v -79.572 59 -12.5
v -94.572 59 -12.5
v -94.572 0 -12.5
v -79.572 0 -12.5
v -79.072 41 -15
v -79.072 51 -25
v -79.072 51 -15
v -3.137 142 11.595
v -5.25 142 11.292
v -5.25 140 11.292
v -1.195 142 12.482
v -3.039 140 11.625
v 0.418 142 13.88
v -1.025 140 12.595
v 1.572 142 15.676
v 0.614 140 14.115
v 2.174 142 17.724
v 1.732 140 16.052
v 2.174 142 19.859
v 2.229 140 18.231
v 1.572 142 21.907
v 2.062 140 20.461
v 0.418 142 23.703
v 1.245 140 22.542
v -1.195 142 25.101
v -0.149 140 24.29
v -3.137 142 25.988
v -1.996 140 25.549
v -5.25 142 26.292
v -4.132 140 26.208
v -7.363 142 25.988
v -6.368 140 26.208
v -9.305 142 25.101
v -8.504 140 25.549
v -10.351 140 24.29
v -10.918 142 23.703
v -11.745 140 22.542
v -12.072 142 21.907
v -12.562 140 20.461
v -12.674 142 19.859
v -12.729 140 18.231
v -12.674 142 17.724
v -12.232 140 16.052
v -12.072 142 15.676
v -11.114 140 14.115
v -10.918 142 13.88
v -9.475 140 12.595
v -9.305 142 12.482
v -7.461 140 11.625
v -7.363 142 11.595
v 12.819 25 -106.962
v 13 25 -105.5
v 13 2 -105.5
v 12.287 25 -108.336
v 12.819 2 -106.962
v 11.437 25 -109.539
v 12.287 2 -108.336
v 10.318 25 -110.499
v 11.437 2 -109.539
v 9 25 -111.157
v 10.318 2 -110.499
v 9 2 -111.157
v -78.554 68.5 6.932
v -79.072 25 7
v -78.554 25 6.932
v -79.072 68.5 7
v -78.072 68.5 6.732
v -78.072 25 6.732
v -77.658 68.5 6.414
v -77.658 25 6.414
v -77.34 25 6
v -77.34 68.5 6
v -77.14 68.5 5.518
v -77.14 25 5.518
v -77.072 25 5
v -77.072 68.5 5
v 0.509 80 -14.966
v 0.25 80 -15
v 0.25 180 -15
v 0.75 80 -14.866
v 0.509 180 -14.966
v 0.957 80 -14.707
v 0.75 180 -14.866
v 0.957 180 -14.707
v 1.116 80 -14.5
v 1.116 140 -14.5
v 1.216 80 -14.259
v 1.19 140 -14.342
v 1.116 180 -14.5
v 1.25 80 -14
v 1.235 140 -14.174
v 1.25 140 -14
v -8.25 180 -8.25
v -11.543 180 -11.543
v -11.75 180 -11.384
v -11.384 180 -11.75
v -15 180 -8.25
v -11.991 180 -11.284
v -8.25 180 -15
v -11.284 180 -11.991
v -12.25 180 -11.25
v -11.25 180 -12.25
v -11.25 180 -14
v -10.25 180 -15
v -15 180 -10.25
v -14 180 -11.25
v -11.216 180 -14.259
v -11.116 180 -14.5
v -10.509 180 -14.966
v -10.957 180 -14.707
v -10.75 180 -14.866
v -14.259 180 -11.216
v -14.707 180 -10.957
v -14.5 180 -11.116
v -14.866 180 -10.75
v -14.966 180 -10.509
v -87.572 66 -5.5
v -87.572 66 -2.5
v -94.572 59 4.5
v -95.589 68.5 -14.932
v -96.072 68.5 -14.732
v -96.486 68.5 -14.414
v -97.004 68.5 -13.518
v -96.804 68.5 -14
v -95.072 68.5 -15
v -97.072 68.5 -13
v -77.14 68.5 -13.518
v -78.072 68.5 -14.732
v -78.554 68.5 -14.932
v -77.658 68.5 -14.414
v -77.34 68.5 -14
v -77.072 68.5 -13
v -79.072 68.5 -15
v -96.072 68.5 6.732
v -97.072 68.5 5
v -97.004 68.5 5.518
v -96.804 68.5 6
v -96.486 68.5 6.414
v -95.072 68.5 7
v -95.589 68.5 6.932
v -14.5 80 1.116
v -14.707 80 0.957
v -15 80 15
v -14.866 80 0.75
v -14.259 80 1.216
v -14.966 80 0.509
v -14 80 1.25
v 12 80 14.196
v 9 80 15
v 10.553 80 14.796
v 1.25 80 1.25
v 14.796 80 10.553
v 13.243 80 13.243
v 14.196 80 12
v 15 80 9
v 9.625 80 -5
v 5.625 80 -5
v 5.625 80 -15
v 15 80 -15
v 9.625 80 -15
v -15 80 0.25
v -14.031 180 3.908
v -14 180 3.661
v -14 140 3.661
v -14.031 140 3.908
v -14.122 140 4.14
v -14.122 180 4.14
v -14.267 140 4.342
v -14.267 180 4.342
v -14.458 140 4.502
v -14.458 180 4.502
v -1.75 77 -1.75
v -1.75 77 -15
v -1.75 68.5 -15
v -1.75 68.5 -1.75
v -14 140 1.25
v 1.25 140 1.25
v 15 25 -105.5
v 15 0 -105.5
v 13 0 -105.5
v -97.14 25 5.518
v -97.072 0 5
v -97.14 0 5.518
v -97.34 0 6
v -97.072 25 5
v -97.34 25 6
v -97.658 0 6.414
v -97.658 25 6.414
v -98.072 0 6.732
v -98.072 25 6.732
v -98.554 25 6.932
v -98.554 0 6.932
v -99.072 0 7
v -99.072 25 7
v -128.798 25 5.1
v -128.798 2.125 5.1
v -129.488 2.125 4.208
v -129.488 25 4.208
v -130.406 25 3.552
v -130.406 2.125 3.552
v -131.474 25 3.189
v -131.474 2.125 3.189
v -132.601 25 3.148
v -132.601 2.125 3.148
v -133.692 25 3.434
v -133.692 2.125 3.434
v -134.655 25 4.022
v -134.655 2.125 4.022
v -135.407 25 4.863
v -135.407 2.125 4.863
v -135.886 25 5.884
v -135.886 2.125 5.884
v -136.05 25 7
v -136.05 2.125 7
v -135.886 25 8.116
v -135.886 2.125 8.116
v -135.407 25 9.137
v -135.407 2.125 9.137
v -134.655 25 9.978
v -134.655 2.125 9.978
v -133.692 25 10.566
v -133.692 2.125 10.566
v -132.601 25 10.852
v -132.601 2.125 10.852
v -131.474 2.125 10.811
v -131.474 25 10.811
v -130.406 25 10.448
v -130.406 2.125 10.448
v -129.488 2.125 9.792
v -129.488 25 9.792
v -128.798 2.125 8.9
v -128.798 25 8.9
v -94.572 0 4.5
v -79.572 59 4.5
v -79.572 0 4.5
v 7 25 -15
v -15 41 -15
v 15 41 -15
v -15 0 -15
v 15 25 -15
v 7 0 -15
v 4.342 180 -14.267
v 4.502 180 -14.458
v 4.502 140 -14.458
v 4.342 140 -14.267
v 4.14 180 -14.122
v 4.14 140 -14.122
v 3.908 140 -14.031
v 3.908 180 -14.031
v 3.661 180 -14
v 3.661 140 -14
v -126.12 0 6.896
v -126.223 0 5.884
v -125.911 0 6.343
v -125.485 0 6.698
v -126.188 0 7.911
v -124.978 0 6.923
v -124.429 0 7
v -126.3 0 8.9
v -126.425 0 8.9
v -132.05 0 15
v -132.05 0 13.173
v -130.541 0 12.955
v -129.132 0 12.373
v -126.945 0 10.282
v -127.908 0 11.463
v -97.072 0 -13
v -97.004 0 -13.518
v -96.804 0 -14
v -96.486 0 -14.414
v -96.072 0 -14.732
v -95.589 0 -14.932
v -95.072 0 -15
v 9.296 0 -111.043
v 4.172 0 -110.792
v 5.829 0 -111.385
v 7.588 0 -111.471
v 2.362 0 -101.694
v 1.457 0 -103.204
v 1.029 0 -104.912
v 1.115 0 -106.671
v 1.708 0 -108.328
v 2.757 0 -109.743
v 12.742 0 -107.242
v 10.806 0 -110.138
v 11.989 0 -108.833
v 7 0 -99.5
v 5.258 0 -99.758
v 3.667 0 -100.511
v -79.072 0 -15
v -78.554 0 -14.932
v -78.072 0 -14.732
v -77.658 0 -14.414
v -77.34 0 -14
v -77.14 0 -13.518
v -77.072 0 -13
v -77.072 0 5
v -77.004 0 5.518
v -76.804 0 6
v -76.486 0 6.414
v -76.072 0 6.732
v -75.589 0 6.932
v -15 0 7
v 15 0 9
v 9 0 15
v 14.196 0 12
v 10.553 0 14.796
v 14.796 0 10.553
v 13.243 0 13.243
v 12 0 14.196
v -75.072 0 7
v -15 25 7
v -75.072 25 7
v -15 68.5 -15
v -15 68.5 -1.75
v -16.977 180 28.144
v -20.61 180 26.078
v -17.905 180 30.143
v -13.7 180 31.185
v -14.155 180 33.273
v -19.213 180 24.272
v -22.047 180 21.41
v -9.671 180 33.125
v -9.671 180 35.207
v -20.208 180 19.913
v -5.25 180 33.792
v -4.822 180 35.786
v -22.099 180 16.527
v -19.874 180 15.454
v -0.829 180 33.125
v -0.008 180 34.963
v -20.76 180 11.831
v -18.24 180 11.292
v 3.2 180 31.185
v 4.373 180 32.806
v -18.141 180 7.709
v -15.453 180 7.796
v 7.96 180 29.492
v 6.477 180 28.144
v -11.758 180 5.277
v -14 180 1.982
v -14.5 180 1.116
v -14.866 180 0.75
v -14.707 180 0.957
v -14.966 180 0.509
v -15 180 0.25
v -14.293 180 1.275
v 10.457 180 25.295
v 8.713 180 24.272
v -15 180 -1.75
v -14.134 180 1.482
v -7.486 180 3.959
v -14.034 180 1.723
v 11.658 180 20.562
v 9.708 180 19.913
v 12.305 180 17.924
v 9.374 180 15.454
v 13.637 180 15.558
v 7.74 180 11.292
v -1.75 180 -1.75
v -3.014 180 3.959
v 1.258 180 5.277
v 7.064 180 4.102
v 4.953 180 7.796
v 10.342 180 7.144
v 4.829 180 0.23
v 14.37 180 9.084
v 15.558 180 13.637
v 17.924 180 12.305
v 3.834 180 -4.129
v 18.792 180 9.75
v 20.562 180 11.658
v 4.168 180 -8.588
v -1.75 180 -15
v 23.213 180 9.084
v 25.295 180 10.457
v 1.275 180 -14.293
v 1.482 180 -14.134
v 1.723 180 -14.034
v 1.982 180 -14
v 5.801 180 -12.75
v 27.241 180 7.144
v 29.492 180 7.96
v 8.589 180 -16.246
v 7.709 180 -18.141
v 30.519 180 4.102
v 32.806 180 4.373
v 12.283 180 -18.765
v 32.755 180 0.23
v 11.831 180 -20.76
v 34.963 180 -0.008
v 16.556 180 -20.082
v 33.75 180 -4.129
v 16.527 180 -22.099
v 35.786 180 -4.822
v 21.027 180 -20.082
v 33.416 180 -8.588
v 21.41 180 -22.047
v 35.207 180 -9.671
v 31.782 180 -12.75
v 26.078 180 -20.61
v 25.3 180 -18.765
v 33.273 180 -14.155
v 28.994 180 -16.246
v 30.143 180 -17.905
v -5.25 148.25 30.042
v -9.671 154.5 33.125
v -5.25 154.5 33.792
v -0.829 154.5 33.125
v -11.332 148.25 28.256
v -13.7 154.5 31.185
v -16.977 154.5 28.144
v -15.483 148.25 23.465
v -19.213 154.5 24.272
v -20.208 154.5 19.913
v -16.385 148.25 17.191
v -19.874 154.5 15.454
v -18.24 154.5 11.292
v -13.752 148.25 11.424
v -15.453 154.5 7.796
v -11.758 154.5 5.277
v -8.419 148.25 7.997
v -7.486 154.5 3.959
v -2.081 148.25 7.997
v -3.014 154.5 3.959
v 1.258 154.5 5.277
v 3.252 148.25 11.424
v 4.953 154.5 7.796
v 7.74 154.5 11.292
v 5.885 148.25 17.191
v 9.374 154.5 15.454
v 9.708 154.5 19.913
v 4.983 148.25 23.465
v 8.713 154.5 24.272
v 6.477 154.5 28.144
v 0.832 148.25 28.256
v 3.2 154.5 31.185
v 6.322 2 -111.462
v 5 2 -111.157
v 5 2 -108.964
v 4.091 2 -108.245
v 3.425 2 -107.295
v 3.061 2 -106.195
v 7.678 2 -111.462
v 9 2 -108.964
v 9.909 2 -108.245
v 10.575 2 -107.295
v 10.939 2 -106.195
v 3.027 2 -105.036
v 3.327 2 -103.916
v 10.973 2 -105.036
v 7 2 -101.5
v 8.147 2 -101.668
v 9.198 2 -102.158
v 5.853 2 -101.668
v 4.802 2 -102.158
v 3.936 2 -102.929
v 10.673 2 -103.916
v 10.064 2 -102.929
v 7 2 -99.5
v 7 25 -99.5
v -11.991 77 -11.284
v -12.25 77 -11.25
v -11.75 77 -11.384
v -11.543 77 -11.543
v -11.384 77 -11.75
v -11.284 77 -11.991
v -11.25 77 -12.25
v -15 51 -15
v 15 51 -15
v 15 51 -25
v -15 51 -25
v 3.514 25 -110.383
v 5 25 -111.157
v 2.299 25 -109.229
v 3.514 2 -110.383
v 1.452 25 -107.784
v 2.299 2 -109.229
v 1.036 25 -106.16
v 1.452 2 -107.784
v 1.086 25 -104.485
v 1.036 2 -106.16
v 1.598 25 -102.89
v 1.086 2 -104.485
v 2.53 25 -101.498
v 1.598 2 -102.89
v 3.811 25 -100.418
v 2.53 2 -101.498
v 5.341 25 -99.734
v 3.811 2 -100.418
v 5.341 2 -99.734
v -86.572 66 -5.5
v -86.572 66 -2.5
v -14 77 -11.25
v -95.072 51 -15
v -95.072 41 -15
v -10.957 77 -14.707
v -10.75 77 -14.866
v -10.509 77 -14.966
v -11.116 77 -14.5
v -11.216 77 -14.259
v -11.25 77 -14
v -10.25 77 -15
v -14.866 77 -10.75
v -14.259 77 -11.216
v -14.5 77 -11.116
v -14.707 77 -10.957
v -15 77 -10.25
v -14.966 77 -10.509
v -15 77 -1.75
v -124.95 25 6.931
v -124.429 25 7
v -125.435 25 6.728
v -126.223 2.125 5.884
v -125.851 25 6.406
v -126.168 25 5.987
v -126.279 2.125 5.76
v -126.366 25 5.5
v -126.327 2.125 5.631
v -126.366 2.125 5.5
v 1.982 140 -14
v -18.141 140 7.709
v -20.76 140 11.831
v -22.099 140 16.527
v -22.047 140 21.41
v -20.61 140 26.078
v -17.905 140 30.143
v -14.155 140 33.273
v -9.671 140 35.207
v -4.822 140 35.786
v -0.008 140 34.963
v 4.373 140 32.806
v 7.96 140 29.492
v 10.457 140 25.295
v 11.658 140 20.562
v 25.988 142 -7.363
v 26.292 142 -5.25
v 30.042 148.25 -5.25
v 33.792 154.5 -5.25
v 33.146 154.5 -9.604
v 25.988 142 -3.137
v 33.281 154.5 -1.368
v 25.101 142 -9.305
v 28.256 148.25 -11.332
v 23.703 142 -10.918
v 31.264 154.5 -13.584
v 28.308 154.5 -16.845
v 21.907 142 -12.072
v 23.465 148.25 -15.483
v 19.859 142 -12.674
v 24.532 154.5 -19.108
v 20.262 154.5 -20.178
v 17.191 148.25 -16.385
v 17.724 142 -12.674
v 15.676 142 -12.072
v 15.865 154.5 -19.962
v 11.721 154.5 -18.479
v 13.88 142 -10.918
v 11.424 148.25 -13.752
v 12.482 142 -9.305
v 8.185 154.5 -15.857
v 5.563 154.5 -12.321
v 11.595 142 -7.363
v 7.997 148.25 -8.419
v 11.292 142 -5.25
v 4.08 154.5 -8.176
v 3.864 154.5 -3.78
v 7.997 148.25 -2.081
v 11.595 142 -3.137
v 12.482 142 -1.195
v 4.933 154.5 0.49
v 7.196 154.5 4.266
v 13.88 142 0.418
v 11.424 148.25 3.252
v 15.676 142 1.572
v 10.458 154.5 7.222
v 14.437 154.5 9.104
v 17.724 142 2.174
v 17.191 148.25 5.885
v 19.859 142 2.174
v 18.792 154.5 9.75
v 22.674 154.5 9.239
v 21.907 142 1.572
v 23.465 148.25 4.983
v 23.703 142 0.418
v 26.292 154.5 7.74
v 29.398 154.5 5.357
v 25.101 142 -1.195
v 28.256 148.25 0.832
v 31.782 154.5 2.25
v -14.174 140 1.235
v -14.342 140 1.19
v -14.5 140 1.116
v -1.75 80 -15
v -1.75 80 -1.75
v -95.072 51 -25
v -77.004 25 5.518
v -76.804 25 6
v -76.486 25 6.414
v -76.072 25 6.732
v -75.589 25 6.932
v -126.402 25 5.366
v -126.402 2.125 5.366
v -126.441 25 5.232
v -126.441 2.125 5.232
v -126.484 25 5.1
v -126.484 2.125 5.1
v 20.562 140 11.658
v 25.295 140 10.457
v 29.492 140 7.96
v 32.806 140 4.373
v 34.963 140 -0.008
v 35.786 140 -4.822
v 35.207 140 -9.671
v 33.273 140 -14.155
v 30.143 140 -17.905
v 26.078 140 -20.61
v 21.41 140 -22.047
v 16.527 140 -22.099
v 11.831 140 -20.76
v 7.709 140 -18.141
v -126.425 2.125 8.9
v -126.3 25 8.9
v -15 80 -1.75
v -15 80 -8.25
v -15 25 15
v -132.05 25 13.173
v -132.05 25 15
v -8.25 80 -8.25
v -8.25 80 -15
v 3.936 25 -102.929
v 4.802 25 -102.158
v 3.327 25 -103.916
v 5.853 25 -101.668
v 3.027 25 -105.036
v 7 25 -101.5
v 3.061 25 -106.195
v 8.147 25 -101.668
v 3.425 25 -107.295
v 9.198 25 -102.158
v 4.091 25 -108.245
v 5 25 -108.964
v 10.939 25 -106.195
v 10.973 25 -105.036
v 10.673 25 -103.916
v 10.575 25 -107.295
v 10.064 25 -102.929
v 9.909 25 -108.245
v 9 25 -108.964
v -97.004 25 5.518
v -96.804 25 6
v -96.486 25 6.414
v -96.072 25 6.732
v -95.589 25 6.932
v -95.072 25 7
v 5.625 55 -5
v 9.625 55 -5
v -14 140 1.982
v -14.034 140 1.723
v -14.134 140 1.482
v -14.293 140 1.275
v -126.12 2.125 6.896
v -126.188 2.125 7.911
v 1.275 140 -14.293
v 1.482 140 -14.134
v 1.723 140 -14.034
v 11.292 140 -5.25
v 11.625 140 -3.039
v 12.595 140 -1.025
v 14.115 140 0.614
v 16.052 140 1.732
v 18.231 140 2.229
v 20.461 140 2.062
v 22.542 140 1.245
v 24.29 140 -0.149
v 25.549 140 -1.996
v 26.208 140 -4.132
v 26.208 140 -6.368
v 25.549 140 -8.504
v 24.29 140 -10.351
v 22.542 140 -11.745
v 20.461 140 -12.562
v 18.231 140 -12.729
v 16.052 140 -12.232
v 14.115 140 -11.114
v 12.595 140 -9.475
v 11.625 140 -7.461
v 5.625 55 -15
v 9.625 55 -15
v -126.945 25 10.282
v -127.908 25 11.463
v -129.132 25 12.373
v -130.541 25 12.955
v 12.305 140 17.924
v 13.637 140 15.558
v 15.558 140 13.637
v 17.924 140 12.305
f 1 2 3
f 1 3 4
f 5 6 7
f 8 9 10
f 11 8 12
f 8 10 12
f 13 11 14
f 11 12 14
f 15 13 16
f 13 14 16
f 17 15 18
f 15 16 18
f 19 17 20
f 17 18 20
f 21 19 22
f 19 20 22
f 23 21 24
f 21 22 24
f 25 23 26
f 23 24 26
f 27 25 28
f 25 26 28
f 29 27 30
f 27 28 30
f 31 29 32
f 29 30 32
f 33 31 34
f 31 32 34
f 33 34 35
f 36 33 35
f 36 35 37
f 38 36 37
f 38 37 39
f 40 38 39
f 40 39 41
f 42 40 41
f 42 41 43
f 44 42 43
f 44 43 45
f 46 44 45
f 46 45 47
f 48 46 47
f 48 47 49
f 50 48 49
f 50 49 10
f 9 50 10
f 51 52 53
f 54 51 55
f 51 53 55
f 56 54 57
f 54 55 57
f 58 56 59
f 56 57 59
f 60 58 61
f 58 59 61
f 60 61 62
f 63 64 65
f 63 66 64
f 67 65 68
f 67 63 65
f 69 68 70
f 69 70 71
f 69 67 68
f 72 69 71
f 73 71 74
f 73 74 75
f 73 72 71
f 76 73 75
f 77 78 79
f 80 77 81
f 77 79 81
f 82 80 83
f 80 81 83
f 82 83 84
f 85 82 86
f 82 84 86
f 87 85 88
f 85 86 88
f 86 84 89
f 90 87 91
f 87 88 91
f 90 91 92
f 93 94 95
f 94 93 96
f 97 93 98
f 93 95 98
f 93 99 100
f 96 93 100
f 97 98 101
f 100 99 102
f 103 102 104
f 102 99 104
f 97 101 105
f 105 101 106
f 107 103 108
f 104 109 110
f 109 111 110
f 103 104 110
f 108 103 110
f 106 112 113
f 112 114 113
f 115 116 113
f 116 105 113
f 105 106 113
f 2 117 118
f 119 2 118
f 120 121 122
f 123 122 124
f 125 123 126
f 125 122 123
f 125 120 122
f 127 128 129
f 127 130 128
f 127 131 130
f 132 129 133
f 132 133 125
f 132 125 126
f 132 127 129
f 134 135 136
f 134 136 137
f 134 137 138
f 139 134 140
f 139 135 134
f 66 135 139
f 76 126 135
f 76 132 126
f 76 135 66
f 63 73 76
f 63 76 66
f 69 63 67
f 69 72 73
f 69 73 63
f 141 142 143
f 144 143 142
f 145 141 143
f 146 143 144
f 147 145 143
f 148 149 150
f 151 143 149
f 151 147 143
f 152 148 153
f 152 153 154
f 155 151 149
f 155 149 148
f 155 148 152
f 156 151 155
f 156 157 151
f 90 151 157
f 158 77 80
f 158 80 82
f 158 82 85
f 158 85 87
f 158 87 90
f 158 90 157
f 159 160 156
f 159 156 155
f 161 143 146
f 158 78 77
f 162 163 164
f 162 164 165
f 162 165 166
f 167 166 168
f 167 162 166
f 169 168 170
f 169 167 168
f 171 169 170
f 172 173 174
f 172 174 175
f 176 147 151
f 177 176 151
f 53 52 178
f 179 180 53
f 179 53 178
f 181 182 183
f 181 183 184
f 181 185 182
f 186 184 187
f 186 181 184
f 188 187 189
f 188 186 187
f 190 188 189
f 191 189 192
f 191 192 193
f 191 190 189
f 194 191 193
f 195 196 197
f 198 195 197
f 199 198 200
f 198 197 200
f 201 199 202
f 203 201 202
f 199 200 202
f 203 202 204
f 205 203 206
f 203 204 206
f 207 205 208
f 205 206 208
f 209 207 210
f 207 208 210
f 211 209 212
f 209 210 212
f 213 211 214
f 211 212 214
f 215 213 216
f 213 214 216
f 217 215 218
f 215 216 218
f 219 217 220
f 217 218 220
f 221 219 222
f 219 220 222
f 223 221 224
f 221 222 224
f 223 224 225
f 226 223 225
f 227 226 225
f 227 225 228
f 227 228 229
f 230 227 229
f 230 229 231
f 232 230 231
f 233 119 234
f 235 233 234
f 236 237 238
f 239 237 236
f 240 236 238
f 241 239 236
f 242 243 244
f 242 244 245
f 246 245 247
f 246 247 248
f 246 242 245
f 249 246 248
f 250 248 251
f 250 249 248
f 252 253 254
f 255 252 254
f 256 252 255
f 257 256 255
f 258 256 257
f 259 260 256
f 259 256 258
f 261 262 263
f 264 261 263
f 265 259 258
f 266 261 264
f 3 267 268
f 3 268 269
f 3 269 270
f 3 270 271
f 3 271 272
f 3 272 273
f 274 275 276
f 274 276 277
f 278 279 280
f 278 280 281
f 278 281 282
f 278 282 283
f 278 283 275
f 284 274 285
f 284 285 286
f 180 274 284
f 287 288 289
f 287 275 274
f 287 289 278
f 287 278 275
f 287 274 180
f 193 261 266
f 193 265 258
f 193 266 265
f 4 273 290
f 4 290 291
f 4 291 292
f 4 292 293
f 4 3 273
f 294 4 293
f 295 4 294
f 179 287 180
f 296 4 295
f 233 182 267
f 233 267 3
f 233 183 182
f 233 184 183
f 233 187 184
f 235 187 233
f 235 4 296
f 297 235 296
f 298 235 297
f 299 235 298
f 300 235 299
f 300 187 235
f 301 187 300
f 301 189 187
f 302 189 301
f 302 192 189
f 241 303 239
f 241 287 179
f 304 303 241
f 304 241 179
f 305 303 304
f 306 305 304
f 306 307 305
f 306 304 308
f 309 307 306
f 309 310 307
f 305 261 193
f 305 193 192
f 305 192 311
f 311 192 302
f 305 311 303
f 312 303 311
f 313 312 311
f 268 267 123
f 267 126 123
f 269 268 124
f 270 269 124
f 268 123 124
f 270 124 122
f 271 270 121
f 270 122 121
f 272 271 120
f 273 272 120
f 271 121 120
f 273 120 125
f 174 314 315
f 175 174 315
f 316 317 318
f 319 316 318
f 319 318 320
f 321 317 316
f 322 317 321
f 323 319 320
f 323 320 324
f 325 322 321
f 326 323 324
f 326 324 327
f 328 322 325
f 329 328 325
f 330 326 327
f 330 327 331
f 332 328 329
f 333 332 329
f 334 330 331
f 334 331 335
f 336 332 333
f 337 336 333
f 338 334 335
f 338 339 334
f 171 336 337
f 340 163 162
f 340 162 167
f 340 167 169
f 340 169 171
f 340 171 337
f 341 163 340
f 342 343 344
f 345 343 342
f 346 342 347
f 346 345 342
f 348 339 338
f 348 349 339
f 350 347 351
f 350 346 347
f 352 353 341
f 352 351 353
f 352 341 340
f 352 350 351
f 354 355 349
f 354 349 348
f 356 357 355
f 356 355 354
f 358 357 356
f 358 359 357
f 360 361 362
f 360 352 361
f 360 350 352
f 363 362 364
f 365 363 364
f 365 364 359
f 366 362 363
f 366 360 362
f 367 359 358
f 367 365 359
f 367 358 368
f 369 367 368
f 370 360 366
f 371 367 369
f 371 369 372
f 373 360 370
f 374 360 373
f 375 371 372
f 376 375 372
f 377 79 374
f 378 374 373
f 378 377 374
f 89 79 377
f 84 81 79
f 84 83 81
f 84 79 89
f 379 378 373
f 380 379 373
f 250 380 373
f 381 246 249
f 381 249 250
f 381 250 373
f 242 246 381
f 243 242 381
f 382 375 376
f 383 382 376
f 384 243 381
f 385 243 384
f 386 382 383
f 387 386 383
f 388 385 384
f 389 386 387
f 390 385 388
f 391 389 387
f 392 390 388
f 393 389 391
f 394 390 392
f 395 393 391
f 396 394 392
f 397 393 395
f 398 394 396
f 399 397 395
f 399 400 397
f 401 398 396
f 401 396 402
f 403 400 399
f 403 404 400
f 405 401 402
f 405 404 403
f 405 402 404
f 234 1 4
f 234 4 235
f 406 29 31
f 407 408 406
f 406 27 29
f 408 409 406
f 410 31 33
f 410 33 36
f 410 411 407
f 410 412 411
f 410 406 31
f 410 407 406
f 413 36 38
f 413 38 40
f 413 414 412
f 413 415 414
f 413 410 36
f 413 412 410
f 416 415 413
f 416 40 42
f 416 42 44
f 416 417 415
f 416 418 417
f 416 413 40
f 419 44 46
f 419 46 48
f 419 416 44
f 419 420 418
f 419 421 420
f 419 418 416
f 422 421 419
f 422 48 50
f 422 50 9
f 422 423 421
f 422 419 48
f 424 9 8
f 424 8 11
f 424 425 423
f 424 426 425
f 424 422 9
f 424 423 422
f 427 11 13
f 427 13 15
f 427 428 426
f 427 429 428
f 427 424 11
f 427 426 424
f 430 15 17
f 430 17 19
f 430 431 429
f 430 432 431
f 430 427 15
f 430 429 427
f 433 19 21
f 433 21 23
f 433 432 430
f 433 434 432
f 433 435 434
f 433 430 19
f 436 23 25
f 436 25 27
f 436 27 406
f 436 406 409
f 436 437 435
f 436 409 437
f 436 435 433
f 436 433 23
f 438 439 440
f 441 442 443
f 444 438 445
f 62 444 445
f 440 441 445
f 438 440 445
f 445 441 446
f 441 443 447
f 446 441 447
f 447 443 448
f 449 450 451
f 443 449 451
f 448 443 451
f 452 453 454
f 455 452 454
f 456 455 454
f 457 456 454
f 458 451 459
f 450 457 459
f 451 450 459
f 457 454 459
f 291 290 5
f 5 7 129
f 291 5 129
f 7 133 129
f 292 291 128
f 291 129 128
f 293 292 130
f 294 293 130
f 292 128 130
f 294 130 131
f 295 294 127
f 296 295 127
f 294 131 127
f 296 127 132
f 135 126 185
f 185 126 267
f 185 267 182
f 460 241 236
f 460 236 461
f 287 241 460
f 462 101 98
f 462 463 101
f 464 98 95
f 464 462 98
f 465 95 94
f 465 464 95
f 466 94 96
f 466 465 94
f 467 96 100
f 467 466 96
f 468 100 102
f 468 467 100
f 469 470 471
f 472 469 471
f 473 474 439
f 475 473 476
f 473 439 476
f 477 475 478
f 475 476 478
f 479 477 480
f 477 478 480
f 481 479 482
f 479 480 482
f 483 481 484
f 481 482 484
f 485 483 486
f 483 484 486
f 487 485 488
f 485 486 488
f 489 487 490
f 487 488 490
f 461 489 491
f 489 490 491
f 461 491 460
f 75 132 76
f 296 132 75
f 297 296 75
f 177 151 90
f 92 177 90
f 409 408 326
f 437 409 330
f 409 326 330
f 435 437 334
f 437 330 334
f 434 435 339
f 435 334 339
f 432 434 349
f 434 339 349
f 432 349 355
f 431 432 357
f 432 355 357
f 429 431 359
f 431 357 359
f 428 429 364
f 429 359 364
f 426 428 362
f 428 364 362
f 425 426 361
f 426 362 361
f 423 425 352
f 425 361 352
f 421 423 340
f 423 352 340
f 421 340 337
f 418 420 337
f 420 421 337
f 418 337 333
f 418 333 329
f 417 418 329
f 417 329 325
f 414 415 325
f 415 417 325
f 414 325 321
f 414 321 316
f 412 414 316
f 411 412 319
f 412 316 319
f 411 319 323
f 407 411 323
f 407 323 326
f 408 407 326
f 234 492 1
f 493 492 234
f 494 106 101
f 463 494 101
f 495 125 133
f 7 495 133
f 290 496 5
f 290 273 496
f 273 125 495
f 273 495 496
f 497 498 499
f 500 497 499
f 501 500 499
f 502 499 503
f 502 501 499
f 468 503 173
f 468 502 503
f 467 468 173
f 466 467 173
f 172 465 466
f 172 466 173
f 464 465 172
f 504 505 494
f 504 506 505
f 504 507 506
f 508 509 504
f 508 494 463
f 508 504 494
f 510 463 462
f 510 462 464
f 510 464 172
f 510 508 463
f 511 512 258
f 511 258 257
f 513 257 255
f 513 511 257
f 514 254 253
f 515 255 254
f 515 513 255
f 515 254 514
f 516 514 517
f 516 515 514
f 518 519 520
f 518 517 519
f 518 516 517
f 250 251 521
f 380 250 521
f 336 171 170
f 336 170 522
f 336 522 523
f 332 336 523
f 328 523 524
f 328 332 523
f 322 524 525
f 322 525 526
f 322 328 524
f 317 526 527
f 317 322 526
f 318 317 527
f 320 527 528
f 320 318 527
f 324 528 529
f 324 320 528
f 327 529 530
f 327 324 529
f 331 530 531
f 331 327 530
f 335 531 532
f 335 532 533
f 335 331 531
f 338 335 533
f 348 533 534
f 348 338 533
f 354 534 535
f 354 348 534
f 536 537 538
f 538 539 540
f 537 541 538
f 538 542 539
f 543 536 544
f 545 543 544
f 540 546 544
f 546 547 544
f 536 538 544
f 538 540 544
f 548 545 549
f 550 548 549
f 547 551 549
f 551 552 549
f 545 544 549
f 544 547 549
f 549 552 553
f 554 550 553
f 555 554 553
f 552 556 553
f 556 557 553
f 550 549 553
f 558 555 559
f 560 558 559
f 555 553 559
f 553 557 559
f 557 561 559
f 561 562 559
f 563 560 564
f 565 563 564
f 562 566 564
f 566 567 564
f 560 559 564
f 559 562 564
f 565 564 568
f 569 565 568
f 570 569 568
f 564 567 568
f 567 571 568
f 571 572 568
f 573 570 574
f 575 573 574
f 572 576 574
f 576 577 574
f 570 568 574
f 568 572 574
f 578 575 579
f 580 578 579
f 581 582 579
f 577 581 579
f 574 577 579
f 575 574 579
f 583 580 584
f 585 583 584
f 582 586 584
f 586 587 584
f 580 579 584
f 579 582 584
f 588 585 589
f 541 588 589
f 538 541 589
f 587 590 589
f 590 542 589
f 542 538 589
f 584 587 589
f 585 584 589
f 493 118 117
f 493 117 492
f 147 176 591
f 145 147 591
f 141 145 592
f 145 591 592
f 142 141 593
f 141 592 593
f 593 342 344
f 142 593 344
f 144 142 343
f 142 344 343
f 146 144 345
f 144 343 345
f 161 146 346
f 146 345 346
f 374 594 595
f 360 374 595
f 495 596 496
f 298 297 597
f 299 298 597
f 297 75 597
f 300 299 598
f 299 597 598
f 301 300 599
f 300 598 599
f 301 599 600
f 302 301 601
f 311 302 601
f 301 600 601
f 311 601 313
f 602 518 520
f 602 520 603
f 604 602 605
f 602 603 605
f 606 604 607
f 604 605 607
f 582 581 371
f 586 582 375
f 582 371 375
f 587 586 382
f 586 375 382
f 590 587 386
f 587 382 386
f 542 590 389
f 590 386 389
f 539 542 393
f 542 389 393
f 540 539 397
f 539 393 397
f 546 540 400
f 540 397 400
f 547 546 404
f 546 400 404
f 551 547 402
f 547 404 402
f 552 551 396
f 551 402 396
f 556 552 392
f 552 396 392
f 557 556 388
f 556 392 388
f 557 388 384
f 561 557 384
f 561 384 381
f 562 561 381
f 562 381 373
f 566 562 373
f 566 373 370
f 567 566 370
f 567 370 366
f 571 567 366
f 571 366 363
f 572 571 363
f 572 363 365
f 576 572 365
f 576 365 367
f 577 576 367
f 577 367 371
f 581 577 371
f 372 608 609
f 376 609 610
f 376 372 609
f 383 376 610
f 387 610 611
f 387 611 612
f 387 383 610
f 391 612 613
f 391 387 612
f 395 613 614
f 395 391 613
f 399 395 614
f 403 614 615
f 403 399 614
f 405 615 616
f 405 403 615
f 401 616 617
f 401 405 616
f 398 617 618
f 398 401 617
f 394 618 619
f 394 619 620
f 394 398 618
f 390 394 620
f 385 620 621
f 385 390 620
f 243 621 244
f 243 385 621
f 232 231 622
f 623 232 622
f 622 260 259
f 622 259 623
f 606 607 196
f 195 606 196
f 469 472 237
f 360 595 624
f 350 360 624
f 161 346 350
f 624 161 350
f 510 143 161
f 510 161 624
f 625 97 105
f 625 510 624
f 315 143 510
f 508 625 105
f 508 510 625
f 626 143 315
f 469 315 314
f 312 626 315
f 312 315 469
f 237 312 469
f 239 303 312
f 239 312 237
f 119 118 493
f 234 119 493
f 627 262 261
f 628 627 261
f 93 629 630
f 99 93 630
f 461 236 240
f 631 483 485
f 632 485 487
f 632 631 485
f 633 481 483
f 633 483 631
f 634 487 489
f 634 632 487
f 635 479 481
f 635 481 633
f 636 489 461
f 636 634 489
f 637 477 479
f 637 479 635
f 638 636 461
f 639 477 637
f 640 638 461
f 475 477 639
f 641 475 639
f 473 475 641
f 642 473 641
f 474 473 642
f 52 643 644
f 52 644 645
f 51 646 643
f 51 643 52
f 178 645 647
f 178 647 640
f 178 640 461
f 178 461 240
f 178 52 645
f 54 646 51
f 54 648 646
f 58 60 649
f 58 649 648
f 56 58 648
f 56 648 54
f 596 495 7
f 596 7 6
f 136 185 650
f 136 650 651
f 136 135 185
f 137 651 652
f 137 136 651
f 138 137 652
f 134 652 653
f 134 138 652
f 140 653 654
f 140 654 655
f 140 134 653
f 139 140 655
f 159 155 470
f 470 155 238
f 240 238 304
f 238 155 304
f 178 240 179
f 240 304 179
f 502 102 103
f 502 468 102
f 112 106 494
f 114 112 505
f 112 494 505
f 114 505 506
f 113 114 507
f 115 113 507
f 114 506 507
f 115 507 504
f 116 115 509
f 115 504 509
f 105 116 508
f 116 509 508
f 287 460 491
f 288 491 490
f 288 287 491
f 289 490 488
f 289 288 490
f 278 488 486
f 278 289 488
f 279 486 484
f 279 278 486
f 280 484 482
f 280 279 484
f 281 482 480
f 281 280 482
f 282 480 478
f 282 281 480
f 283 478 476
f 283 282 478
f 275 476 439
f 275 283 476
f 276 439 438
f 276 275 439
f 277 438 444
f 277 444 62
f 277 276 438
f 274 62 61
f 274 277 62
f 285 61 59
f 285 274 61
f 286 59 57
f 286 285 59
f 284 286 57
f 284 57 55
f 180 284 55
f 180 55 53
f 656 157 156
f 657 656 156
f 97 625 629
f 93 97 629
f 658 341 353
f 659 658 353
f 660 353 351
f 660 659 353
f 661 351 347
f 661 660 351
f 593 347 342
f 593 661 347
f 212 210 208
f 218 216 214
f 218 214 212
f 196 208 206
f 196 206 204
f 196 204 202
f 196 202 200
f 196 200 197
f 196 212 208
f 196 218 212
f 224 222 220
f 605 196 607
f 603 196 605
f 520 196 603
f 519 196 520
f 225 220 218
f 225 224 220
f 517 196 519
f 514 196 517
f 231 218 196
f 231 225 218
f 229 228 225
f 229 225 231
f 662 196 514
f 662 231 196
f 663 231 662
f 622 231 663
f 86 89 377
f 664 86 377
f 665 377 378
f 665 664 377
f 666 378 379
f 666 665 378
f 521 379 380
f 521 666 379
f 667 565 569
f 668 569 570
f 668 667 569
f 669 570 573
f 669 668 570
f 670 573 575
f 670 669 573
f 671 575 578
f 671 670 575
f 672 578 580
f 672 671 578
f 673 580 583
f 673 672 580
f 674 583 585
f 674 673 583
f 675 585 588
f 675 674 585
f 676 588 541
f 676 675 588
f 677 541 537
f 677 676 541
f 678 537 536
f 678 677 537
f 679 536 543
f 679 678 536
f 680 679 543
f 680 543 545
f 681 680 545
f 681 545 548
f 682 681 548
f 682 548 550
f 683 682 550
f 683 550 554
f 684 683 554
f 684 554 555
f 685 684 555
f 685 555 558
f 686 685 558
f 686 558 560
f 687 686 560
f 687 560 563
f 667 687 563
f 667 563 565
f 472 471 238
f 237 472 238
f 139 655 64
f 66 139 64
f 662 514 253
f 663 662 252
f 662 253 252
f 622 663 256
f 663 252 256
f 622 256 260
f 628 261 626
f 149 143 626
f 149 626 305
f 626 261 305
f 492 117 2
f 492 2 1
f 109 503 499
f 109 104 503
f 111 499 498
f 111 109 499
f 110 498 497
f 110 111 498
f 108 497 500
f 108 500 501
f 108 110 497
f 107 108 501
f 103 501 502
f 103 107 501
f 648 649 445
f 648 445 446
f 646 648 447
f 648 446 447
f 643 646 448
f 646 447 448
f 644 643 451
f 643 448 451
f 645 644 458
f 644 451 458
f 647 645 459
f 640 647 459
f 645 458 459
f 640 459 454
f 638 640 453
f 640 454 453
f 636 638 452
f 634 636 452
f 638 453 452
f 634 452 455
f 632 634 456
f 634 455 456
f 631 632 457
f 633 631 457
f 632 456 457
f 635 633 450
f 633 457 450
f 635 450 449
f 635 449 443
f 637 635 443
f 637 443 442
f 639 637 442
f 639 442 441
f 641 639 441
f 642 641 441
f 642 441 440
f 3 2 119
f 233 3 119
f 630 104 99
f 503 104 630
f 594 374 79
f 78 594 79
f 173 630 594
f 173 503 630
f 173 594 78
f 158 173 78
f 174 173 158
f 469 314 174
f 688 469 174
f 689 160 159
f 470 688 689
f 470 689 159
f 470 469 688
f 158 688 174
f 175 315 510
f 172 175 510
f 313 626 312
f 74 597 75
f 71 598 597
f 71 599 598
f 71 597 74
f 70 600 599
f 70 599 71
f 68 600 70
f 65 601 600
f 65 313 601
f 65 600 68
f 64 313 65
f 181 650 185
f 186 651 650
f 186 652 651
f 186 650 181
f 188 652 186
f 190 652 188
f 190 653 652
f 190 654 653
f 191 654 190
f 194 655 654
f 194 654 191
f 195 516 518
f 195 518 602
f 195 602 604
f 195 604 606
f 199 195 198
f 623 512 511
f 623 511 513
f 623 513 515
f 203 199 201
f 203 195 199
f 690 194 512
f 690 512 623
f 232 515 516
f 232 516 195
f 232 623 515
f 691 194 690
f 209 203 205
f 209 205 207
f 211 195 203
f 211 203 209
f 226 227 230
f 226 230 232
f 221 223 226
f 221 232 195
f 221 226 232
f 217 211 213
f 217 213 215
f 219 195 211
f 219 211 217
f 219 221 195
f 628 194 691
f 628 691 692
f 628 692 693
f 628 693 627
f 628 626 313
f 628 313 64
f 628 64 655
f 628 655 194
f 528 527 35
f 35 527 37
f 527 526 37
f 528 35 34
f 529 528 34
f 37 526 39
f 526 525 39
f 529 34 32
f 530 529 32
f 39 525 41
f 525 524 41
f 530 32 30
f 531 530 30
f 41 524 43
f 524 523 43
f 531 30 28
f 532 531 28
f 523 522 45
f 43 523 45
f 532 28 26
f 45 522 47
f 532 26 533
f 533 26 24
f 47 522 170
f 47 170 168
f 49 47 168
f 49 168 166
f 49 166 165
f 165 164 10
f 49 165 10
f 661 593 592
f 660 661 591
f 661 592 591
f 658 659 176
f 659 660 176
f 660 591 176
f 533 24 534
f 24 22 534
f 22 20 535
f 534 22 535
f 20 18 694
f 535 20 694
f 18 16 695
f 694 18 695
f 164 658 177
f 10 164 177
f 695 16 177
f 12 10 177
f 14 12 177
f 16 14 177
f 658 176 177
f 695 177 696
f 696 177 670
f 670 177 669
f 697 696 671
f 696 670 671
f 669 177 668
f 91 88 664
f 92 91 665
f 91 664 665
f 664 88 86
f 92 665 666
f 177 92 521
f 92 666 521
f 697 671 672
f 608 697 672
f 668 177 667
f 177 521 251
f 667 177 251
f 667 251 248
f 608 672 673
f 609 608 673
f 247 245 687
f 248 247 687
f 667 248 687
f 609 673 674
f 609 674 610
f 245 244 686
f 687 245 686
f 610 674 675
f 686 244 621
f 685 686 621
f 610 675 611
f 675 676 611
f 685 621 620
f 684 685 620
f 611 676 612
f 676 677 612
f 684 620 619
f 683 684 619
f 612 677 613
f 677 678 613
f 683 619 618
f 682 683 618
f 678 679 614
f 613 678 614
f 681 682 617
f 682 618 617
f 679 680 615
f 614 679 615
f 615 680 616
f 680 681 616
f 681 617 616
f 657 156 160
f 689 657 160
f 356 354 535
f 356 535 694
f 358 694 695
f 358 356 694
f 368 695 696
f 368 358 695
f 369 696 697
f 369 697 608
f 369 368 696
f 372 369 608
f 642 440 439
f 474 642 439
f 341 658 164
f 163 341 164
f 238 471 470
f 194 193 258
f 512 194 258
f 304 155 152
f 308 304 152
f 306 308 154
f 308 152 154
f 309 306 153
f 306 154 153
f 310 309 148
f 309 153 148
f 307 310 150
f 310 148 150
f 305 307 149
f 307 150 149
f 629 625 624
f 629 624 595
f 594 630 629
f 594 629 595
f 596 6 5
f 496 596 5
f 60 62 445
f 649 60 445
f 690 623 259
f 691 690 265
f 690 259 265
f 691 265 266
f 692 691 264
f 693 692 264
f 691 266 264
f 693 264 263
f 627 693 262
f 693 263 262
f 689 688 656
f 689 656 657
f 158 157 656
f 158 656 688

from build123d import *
from build123d.topology import SkipClean

# Parameters (mm, degrees)
SKETCH1_W                 = 30
SKETCH1_H                 = 30
BOSS_EXTRUDE1_DEPTH       = 80
SKETCH2_R                 = 6
BOSS_EXTRUDE2_DEPTH       = 22
CUT_EXTRUDE1_DEPTH        = 83.764726786
BOSS_EXTRUDE3_DEPTH       = 100
BOSS_EXTRUDE5_DEPTH       = 2
BOSS_EXTRUDE6_DEPTH       = 23
BOSS_EXTRUDE7_DEPTH       = 25
FILLET1_R                 = 2
SKETCH11_R                = 6.055782361
CUT_EXTRUDE2_DEPTH        = 2.125
SKETCH12_W                = 13.25
SKETCH12_H                = 8.5
CUT_EXTRUDE4_DEPTH        = 13.25
CUT_EXTRUDE5_REACH        = 204.341
SKETCH15_W                = 3.75
SKETCH15_H                = 3.75
FILLET2_R                 = 1
CUT_EXTRUDE7_START        = 22
SKETCH16_R                = 6
CUT_EXTRUDE7_DEPTH        = 22
SKETCH17_R                = 15
BOSS_EXTRUDE8_DEPTH       = 40
FILLET3_R                 = 1
SKETCH18_R                = 15
SKETCH18_R_2              = 7.5
BOSS_EXTRUDE9_DEPTH       = 2
SKETCH22_W                = 4
SKETCH22_H                = 10
CUT_EXTRUDE8_DEPTH        = 25
BOSS_EXTRUDE10_REACH      = 253.678
SKETCH23_W                = 20
SKETCH23_H                = 22
SKETCH24_W                = 15
SKETCH24_H                = 17
CUT_EXTRUDE9_DEPTH        = 66
FILLET4_R                 = 2
FILLET5_R                 = 2
CHAMFER1_SIZE             = 7
BOSS_EXTRUDE11_DEPTH      = 30
BOSS_EXTRUDE12_DEPTH      = 7.999995
BOSS_EXTRUDE12_DEPTH_BACK = 8.000005


with BuildPart() as part:
    # Sketch1 → Boss-Extrude1 (new body)
    with BuildSketch(Plane(origin=(0, 0, 0), x_dir=(1, 0, 0), z_dir=(0, 1, 0))):
        Rectangle(SKETCH1_W, SKETCH1_H)
    extrude(amount=BOSS_EXTRUDE1_DEPTH)

    # Sketch2 → Boss-Extrude2 (add)
    with BuildSketch(Plane(origin=(0, 80, 0), x_dir=(1, 0, 0), z_dir=(0, 1, 0))):
        with Locations(Location((9, -9, 0), (0, 0, 270))):
            Circle(SKETCH2_R)
    extrude(amount=BOSS_EXTRUDE2_DEPTH)

    # Sketch3 → Cut-Extrude1 (cut, through all)
    with BuildSketch(Plane(origin=(0, 80, 0), x_dir=(1, 0, 0), z_dir=(0, 1, 0))):
        with BuildLine():
            Line((9, -15), (15, -15))
            Line((15, -15), (15, -9))
            ThreePointArc((15, -9), (13.242640687, -13.242640687), (9, -15))
        make_face()
    extrude(amount=-CUT_EXTRUDE1_DEPTH, mode=Mode.SUBTRACT)

    # Sketch4 → Boss-Extrude3 (add)
    with BuildSketch(Plane(origin=(0, 80, 0), x_dir=(1, 0, 0), z_dir=(0, 1, 0))):
        Polygon((-8.25, 11.25), (-8.25, 8.25), (-11.25, 8.25), (-15, 8.25), (-15, 11.25), (-11.25, 11.25), (-11.25, 15), (-8.25, 15), align=None)
        Polygon((-1.75, 1.75), (-11.25, 1.75), (-15, 1.75), (-15, -1.25), (-11.25, -1.25), (1.25, -1.25), (1.25, 11.25), (1.25, 15), (-1.75, 15), (-1.75, 11.25), align=None)
    extrude(amount=BOSS_EXTRUDE3_DEPTH)

    # Sketch6 → Boss-Extrude5 (add)
    with BuildSketch(Plane.XZ):
        with BuildLine():
            Line((15, -15), (7, -15))
            Line((7, -15), (7, -99.5))
            ThreePointArc((7, -99.5), (2.757359313, -109.742640687), (13, -105.5))
            Line((13, -105.5), (15, -105.5))
            Line((15, -105.5), (15, -15))
        make_face()
    extrude(amount=-BOSS_EXTRUDE5_DEPTH)

    # Sketch7 → Boss-Extrude6 (add)
    with SkipClean():  # the faces are left unmerged after this step: merging them gives an invalid solid
        with BuildSketch(Plane(origin=(0, 2, 0), x_dir=(1, 0, 0), z_dir=(0, 1, 0))):
            with BuildLine():
                Line((9, 111.156854249), (9, 108.964101615))
                ThreePointArc((9, 108.964101615), (7, 101.5), (5, 108.964101615))
                Line((5, 108.964101615), (5, 111.156854249))
                ThreePointArc((5, 111.156854249), (1.086408642, 104.485388128), (7, 99.5))
                Line((7, 99.5), (7, 15))
                Line((7, 15), (15, 15))
                Line((15, 15), (15, 105.5))
                Line((15, 105.5), (13, 105.5))
                ThreePointArc((13, 105.5), (11.898979486, 108.964101615), (9, 111.156854249))
            make_face()
        extrude(amount=BOSS_EXTRUDE6_DEPTH)

    # Sketch9 → Boss-Extrude7 (add)
    with SkipClean():  # the faces are left unmerged after this step: merging them gives an invalid solid
        with BuildSketch(Plane.XZ):
            with BuildLine():
                Line((-15, 15), (-15, 7))
                Line((-15, 7), (-126.175, 7))
                ThreePointArc((-126.175, 7), (-126.252697751, 6.037536458), (-126.48377869, 5.1))
                Line((-126.48377869, 5.1), (-128.797778509, 5.1))
                ThreePointArc((-128.797778509, 5.1), (-136.05, 7), (-128.797778509, 8.9))
                Line((-128.797778509, 8.9), (-126.3, 8.9))
                ThreePointArc((-126.3, 8.9), (-128.491885554, 11.955834237), (-132.050001601, 13.173329766))
                Line((-132.050001601, 13.173329766), (-132.050001601, 15))
                Line((-132.050001601, 15), (-15, 15))
            make_face()
        extrude(amount=-BOSS_EXTRUDE7_DEPTH)

    # Fillet1
    fillet1_edges = [part.edges().sort_by_distance(p)[0] for p in [
        (-126.175, 12.5, 7),
    ]]
    fillet(fillet1_edges, radius=FILLET1_R)

    # Sketch11 → Cut-Extrude2 (cut)
    with SkipClean():  # the faces are left unmerged after this step: merging them gives an invalid solid
        with BuildSketch(Plane.XZ):
            with Locations((-132.175, 7)):
                Circle(SKETCH11_R)
        extrude(amount=-CUT_EXTRUDE2_DEPTH, mode=Mode.SUBTRACT)

    # Sketch12 → Cut-Extrude4 (cut)
    with SkipClean():  # the faces are left unmerged after this step: merging them gives an invalid solid
        with BuildSketch(Plane.ZY.offset(15)):
            with Locations((-8.375, 72.75)):
                Rectangle(SKETCH12_W, SKETCH12_H)
        extrude(amount=-CUT_EXTRUDE4_DEPTH, mode=Mode.SUBTRACT)

    # Sketch15 → Cut-Extrude5 (cut, up to next)
    with BuildSketch(Plane(origin=(0, 80, 0), x_dir=(1, 0, 0), z_dir=(0, 1, 0)), mode=Mode.PRIVATE) as cut_extrude5_sk1:
        with Locations((-13.125, 13.125)):
            Rectangle(SKETCH15_W, SKETCH15_H)
    cut_extrude5_tool1 = extrude(cut_extrude5_sk1.sketch, amount=-CUT_EXTRUDE5_REACH, mode=Mode.PRIVATE) & part.part
    add(cut_extrude5_tool1.solids().sort_by_distance((-13.125, 80, -13.125))[0], mode=Mode.SUBTRACT)

    # Fillet2
    fillet2_edges = [part.edges().sort_by_distance(p)[0] for p in [
        (-11.25, 130, -15),
        (-11.25, 130, -11.25),
        (-15, 130, -11.25),
        (-15, 130, 1.25),
        (1.25, 130, -15),
    ]]
    fillet(fillet2_edges, radius=FILLET2_R)

    # Sketch16 → Cut-Extrude7 (cut)
    with SkipClean():  # the faces are left unmerged after this step: merging them gives an invalid solid
        with BuildSketch(Plane(origin=(0, 80, 0), x_dir=(1, 0, 0), z_dir=(0, 1, 0)).offset(CUT_EXTRUDE7_START)):
            with Locations((9, -9)):
                Circle(SKETCH16_R)
        extrude(amount=-CUT_EXTRUDE7_DEPTH, mode=Mode.SUBTRACT)


with BuildPart() as cut_extrude7_kept_piece:
    # of the separate pieces the step leaves, the one the design keeps (cut_extrude7_pieces_kept)
    add(part.part.solids().sort_by_distance((-15, 80, 0.25))[0])

    # Sketch17 → Boss-Extrude8 (add)
    with SkipClean():  # the faces are left unmerged after this step: merging them gives an invalid solid
        with BuildSketch(Plane(origin=(0, 180, 0), x_dir=(1, 0, 0), z_dir=(0, 1, 0))):
            with BuildLine():
                Line((-14, -1.25), (-14, -4.216394713))
                ThreePointArc((-14, -4.216394713), (-14.384018227, -33.129332993), (11.657578086, -20.561885701))
                ThreePointArc((11.657578086, -20.561885701), (14.532144442, -14.532144442), (20.561885701, -11.657578086))
                ThreePointArc((20.561885701, -11.657578086), (33.129332993, 14.384018227), (4.216394713, 14))
                Line((4.216394713, 14), (1.25, 14))
                Line((1.25, 14), (1.25, -1.25))
                Line((1.25, -1.25), (-14, -1.25))
            make_face()
            with Locations(Location((18.79163056, 5.25, 0), (0, 0, 270))):
                Circle(SKETCH17_R, mode=Mode.SUBTRACT)
            with Locations(Location((-5.25, -18.79163056, 0), (0, 0, 270))):
                Circle(SKETCH17_R, mode=Mode.SUBTRACT)
        extrude(amount=-BOSS_EXTRUDE8_DEPTH)

    # Fillet3
    # the kernel refuses this fillet: 1 mm, written as the material it adds along each edge
    with BuildSketch(Plane(origin=(-14, 140, 1.25), x_dir=(-0.9659258262890684, 0, -0.25881904510252046), z_dir=(0, 1, 0))) as fillet3_piece_1:
        with BuildLine():
            CenterArc((0.776457135, 0.965925826), FILLET3_R, 195, 60)
            Line((-0.189468691, 0.707106781), (0, 0))
            ThreePointArc((0, 0), (0.258819045, 0.034074174), (0.51763809, 0))
        make_face()
    extrude(amount=40)
    with BuildSketch(Plane(origin=(-14, 180, 4.216394713), x_dir=(0, 0, -1), z_dir=(0, -1, 0))) as fillet3_piece_2:
        with BuildLine():
            CenterArc((0.555444904, -1), FILLET3_R, 90, 57.202831704)
            ThreePointArc((-0.285148471, -0.458333333), (-0.140754957, -0.230298516), (0, 0))
            Line((0, 0), (0.555444904, 0))
        make_face()
    extrude(amount=40)
    with BuildSketch(Plane(origin=(1.25, 140, -14), x_dir=(-0.2588190451025201, 0, -0.9659258262890685), z_dir=(0, 1, 0))) as fillet3_piece_3:
        with BuildLine():
            CenterArc((0.776457135, -0.965925826), FILLET3_R, 105, 60)
            Line((-0.189468691, -0.707106781), (0, 0))
            ThreePointArc((0, 0), (0.258819045, -0.034074174), (0.51763809, 0))
        make_face()
    extrude(amount=40)
    with BuildSketch(Plane(origin=(4.216394713, 180, -14), x_dir=(-1, 0, 0), z_dir=(0, -1, 0))) as fillet3_piece_4:
        with BuildLine():
            CenterArc((0.555444904, 1), FILLET3_R, 212.797168296, 57.202831704)
            ThreePointArc((-0.285148471, 0.458333333), (-0.140754957, 0.230298516), (0, 0))
            Line((0, 0), (0.555444904, 0))
        make_face()
    extrude(amount=40)

    # Sketch18 → Boss-Extrude9 (add)
    with SkipClean():  # the faces are left unmerged after this step: merging them gives an invalid solid
        with BuildSketch(Plane.XZ.offset(-140)):
            with Locations(Location((-5.25, 18.79163056, 0), (0, 0, 90))):
                Circle(SKETCH18_R)
            with Locations(Location((-5.25, 18.79163056, 0), (0, 0, 270))):
                Circle(SKETCH18_R_2, mode=Mode.SUBTRACT)
        boss_extrude9 = extrude(amount=-BOSS_EXTRUDE9_DEPTH)

    # Sketch21 → Revolve1 (revolve)
    with SkipClean():  # the faces are left unmerged after this step: merging them gives an invalid solid
        with BuildSketch(Plane(origin=(-5.25, 0, 0), x_dir=(0, 0, -1), z_dir=(-1, 0, 0)), mode=Mode.PRIVATE) as revolve1_sk:
            Polygon((-11.29163056, -142), (-3.79163056, -154.5), (-3.79163056, -142), align=None)
        revolve1 = revolve(revolve1_sk.sketch.rotate(Axis((-5.25, 1065, 18.79163056), (0, -1, 0)), 180), axis=Axis((-5.25, 1065, 18.79163056), (0, -1, 0)))

    # Mirror1: Boss-Extrude9, Revolve1 across plane
    with SkipClean():  # the faces are left unmerged after this step: merging them gives an invalid solid
        add(boss_extrude9.mirror(Plane(origin=(0, 0, 0), x_dir=(0.7071067811865478, 0, 0.7071067811865472), z_dir=(0.7071067811865475, 0, -0.7071067811865477))))
        add(revolve1.mirror(Plane(origin=(0, 0, 0), x_dir=(0.7071067811865478, 0, 0.7071067811865472), z_dir=(0.7071067811865475, 0, -0.7071067811865477))))

    # Sketch22 → Cut-Extrude8 (cut)
    with SkipClean():  # the faces are left unmerged after this step: merging them gives an invalid solid
        with BuildSketch(Plane(origin=(0, 80, 0), x_dir=(1, 0, 0), z_dir=(0, 1, 0))):
            with Locations((7.625, 10)):
                Rectangle(SKETCH22_W, SKETCH22_H)
        extrude(amount=-CUT_EXTRUDE8_DEPTH, mode=Mode.SUBTRACT)

    # Boss-Extrude10: up to this face of the body (flat: up to its plane)
    boss_extrude10_end = Plane(cut_extrude7_kept_piece.part.faces().sort_by_distance((-8.375, 68.5, -8.375))[0])
    # Sketch23 → Boss-Extrude10 (add, up to the picked face)
    with BuildSketch(Plane.XZ, mode=Mode.PRIVATE) as boss_extrude10_sk1:
        with Locations((-87.071774981, -4)):
            Rectangle(SKETCH23_W, SKETCH23_H)
    boss_extrude10_tool1 = split(extrude(boss_extrude10_sk1.sketch, amount=-BOSS_EXTRUDE10_REACH, mode=Mode.PRIVATE), bisect_by=boss_extrude10_end, keep=Keep.BOTH, mode=Mode.PRIVATE)
    add(boss_extrude10_tool1.solids().sort_by(Axis((-87.071775, 0, -4), (0, 1, 0)))[0])

    # Sketch24 → Cut-Extrude9 (cut)
    with SkipClean():  # the faces are left unmerged after this step: merging them gives an invalid solid
        with BuildSketch(Plane.XZ):
            with Locations((-87.071774981, -4)):
                Rectangle(SKETCH24_W, SKETCH24_H)
        extrude(amount=-CUT_EXTRUDE9_DEPTH, mode=Mode.SUBTRACT)

    # Fillet4
    fillet4_edges = [cut_extrude7_kept_piece.edges().sort_by_distance(p)[0] for p in [
        (-97.071774981, 34.25, -15),
        (-97.071774981, 12.5, 7),
        (-77.071774981, 12.5, 7),
        (-77.071774981, 34.25, -15),
    ]]
    fillet(fillet4_edges, radius=FILLET4_R)

    # Fillet5
    fillet5_edges = [cut_extrude7_kept_piece.edges().sort_by_distance(p)[0] for p in [
        (-77.071774981, 46.75, 7),
        (-97.071774981, 46.75, 7),
    ]]
    fillet(fillet5_edges, radius=FILLET5_R)

    # Chamfer1
    chamfer1_edges = [cut_extrude7_kept_piece.edges().sort_by_distance(p)[0] for p in [
        (-94.571774981, 66, -4),
        (-87.071774981, 66, 4.5),
        (-79.571774981, 66, -4),
        (-87.071774981, 66, -12.5),
    ]]
    chamfer(chamfer1_edges, length=CHAMFER1_SIZE)

    # Sketch26 → Boss-Extrude11 (add)
    with SkipClean():  # the faces are left unmerged after this step: merging them gives an invalid solid
        with BuildSketch(Plane(origin=(15, 0, 0), x_dir=(0, 0, -1), z_dir=(1, 0, 0))):
            Polygon((15, 51), (25, 51), (15, 41), align=None)
        extrude(amount=-BOSS_EXTRUDE11_DEPTH)

    # Sketch27 → Boss-Extrude12 (add, two sides: drawn at the far end of the back side and taken through both)
    with SkipClean():  # the faces are left unmerged after this step: merging them gives an invalid solid
        with BuildSketch(Plane.ZY.offset(87.071774981).offset(-BOSS_EXTRUDE12_DEPTH_BACK)):
            Polygon((-15, 51), (-25, 51), (-15, 41), align=None)
        extrude(amount=BOSS_EXTRUDE12_DEPTH + BOSS_EXTRUDE12_DEPTH_BACK)


solid = cut_extrude7_kept_piece.part
